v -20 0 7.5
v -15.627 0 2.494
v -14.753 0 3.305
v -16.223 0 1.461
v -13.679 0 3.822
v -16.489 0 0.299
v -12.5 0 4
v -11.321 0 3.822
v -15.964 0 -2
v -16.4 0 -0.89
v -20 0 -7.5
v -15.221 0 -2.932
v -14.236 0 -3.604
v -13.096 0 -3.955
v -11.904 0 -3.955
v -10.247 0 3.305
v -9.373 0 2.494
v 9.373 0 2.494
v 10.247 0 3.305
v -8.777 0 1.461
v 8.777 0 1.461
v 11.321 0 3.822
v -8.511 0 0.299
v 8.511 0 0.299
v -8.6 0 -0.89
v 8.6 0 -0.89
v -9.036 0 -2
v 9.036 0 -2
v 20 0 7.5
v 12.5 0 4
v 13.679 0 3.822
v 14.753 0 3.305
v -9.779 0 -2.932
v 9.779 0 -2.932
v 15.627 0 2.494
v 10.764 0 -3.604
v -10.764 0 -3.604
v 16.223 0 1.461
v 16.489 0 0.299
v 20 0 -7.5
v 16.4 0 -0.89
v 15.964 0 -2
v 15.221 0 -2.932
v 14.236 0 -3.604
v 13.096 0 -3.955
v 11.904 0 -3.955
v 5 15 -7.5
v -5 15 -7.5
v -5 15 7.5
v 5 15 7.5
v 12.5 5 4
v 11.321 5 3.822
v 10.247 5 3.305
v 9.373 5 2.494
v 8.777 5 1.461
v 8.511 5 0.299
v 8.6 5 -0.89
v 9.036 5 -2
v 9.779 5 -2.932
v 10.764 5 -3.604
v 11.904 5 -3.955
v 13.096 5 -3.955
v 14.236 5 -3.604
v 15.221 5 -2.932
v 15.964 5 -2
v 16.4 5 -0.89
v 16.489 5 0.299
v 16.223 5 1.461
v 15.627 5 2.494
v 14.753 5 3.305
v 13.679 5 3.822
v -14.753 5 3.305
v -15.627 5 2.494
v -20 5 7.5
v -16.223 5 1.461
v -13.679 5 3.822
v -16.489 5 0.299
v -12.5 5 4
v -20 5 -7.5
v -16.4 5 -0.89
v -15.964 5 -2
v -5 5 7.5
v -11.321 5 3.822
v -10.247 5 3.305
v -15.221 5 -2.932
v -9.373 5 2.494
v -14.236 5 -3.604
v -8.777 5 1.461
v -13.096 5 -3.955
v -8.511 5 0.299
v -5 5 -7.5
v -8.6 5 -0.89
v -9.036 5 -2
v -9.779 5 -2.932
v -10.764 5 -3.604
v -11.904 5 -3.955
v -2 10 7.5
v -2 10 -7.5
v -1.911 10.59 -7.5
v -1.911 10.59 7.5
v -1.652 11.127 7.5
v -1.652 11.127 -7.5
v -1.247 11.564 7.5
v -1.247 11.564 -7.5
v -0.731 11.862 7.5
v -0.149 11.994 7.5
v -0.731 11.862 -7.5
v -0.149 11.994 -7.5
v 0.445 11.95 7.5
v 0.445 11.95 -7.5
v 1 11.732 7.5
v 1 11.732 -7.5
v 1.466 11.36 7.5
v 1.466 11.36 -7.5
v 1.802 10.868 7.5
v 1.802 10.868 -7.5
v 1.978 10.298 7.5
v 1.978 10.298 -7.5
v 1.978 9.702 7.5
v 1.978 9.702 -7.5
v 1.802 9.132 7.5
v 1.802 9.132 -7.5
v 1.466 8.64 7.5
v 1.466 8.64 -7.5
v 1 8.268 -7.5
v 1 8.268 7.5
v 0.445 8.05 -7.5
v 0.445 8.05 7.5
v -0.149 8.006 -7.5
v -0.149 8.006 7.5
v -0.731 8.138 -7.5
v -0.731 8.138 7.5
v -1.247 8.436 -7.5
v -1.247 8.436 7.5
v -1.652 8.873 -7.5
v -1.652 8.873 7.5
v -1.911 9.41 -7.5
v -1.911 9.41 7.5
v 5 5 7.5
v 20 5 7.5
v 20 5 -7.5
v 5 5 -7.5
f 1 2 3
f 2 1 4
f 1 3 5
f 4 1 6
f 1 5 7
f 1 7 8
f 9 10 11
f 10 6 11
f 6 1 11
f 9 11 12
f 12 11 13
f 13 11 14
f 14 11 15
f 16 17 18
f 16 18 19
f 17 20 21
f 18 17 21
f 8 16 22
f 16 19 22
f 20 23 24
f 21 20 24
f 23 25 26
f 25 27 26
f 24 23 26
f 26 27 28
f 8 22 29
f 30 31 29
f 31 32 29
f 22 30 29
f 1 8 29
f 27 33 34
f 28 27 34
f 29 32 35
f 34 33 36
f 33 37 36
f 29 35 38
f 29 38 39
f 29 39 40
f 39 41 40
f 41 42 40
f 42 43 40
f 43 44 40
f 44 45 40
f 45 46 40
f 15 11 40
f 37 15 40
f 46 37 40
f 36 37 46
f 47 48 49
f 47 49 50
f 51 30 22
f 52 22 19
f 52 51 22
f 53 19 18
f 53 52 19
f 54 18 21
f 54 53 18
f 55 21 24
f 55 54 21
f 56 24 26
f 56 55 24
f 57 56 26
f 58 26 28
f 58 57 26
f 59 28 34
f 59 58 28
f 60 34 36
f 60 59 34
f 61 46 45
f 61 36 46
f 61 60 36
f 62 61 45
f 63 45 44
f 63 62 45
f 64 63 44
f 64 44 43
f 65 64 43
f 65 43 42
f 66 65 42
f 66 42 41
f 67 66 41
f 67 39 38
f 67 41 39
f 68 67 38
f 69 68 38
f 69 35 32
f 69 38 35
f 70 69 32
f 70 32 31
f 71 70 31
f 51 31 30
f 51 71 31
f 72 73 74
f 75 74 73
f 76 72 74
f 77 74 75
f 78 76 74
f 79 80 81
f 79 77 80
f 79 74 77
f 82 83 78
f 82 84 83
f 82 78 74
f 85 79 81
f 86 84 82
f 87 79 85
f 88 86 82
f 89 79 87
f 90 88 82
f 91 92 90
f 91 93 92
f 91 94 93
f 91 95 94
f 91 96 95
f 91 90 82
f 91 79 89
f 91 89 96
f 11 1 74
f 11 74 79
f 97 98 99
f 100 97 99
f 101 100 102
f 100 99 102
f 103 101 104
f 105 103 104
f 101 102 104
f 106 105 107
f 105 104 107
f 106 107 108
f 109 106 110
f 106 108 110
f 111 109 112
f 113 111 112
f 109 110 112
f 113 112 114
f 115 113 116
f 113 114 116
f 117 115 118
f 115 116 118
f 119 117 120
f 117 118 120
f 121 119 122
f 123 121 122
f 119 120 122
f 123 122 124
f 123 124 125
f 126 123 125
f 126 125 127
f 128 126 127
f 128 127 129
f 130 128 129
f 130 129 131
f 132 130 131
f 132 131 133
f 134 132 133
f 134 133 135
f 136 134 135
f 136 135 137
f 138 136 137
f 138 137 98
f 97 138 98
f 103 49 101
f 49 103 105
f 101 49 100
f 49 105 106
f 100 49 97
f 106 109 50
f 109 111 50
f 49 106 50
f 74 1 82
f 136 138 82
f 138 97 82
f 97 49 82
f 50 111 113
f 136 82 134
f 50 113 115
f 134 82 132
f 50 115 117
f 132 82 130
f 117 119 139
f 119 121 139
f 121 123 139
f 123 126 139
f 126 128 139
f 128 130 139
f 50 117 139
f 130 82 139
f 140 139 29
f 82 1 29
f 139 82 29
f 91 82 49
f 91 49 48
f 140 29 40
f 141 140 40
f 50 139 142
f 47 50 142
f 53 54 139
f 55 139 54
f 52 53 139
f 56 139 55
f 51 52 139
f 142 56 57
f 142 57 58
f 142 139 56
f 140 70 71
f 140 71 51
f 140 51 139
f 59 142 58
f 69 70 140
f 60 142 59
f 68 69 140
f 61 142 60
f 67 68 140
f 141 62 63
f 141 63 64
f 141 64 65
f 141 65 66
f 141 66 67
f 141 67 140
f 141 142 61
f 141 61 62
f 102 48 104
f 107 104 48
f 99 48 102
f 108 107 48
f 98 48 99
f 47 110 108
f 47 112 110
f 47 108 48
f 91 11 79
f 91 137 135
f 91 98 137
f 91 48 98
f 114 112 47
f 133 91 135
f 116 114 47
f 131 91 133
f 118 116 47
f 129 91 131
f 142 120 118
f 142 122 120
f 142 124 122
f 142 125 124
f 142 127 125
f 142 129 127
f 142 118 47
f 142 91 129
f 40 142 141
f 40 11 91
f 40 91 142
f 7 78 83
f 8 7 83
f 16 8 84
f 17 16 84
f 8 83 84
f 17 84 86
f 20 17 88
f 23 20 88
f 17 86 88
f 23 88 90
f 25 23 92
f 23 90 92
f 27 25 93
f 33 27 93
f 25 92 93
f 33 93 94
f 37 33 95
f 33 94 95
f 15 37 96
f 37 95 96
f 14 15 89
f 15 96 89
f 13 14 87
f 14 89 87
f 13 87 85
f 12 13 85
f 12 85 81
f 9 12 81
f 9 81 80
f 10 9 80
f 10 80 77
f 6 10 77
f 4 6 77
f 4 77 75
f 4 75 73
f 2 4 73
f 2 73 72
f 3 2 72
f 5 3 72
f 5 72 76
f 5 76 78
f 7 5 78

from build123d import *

# Parameters (mm, degrees)
SKETCH_1_W          = 40
SKETCH_1_H          = 15
EXTRUDE_3_DEPTH     = 5
SKETCH_2_W          = 10
SKETCH_2_H          = 15
EXTRUDE_4_DEPTH     = 10
SKETCH_4_R          = 2
CUT_EXTRUDE_1_DEPTH = 30.154759474
SKETCH_8_R          = 4
CUT_EXTRUDE_3_DEPTH = 24.58495283


with BuildPart() as part:
    # 草图1 → 凸台-拉伸3 (new body)
    with BuildSketch(Plane(origin=(0, 0, 0), x_dir=(1, 0, 0), z_dir=(0, 1, 0))):
        Rectangle(SKETCH_1_W, SKETCH_1_H)
    extrude(amount=EXTRUDE_3_DEPTH)

    # 草图2 → 凸台-拉伸4 (add)
    with BuildSketch(Plane(origin=(0, 5, 0), x_dir=(1, 0, 0), z_dir=(0, 1, 0))):
        Rectangle(SKETCH_2_W, SKETCH_2_H)
    extrude(amount=EXTRUDE_4_DEPTH)

    # 草图4 → 切除-拉伸1 (cut, through all)
    with BuildSketch(Plane(origin=(0, 0, -7.5), x_dir=(-1, 0, 0), z_dir=(0, 0, -1))):
        with Locations((0, 10)):
            Circle(SKETCH_4_R)
    extrude(amount=-CUT_EXTRUDE_1_DEPTH, mode=Mode.SUBTRACT)

    # 草图8 → 切除-拉伸3 (cut, through all)
    with BuildSketch(Plane(origin=(0, 5, 0), x_dir=(1, 0, 0), z_dir=(0, 1, 0))):
        with Locations(Location((-12.5, 0, 0), (0, 0, 270))):
            Circle(SKETCH_8_R)
    cut_extrude_3 = extrude(amount=-CUT_EXTRUDE_3_DEPTH, mode=Mode.SUBTRACT)

    # 镜向1: 切除-拉伸3 across plane
    add(cut_extrude_3.mirror(Plane(origin=(0, 0, 0), x_dir=(0, 0, 1), z_dir=(1, 0, 0))), mode=Mode.SUBTRACT)


solid = part.part
